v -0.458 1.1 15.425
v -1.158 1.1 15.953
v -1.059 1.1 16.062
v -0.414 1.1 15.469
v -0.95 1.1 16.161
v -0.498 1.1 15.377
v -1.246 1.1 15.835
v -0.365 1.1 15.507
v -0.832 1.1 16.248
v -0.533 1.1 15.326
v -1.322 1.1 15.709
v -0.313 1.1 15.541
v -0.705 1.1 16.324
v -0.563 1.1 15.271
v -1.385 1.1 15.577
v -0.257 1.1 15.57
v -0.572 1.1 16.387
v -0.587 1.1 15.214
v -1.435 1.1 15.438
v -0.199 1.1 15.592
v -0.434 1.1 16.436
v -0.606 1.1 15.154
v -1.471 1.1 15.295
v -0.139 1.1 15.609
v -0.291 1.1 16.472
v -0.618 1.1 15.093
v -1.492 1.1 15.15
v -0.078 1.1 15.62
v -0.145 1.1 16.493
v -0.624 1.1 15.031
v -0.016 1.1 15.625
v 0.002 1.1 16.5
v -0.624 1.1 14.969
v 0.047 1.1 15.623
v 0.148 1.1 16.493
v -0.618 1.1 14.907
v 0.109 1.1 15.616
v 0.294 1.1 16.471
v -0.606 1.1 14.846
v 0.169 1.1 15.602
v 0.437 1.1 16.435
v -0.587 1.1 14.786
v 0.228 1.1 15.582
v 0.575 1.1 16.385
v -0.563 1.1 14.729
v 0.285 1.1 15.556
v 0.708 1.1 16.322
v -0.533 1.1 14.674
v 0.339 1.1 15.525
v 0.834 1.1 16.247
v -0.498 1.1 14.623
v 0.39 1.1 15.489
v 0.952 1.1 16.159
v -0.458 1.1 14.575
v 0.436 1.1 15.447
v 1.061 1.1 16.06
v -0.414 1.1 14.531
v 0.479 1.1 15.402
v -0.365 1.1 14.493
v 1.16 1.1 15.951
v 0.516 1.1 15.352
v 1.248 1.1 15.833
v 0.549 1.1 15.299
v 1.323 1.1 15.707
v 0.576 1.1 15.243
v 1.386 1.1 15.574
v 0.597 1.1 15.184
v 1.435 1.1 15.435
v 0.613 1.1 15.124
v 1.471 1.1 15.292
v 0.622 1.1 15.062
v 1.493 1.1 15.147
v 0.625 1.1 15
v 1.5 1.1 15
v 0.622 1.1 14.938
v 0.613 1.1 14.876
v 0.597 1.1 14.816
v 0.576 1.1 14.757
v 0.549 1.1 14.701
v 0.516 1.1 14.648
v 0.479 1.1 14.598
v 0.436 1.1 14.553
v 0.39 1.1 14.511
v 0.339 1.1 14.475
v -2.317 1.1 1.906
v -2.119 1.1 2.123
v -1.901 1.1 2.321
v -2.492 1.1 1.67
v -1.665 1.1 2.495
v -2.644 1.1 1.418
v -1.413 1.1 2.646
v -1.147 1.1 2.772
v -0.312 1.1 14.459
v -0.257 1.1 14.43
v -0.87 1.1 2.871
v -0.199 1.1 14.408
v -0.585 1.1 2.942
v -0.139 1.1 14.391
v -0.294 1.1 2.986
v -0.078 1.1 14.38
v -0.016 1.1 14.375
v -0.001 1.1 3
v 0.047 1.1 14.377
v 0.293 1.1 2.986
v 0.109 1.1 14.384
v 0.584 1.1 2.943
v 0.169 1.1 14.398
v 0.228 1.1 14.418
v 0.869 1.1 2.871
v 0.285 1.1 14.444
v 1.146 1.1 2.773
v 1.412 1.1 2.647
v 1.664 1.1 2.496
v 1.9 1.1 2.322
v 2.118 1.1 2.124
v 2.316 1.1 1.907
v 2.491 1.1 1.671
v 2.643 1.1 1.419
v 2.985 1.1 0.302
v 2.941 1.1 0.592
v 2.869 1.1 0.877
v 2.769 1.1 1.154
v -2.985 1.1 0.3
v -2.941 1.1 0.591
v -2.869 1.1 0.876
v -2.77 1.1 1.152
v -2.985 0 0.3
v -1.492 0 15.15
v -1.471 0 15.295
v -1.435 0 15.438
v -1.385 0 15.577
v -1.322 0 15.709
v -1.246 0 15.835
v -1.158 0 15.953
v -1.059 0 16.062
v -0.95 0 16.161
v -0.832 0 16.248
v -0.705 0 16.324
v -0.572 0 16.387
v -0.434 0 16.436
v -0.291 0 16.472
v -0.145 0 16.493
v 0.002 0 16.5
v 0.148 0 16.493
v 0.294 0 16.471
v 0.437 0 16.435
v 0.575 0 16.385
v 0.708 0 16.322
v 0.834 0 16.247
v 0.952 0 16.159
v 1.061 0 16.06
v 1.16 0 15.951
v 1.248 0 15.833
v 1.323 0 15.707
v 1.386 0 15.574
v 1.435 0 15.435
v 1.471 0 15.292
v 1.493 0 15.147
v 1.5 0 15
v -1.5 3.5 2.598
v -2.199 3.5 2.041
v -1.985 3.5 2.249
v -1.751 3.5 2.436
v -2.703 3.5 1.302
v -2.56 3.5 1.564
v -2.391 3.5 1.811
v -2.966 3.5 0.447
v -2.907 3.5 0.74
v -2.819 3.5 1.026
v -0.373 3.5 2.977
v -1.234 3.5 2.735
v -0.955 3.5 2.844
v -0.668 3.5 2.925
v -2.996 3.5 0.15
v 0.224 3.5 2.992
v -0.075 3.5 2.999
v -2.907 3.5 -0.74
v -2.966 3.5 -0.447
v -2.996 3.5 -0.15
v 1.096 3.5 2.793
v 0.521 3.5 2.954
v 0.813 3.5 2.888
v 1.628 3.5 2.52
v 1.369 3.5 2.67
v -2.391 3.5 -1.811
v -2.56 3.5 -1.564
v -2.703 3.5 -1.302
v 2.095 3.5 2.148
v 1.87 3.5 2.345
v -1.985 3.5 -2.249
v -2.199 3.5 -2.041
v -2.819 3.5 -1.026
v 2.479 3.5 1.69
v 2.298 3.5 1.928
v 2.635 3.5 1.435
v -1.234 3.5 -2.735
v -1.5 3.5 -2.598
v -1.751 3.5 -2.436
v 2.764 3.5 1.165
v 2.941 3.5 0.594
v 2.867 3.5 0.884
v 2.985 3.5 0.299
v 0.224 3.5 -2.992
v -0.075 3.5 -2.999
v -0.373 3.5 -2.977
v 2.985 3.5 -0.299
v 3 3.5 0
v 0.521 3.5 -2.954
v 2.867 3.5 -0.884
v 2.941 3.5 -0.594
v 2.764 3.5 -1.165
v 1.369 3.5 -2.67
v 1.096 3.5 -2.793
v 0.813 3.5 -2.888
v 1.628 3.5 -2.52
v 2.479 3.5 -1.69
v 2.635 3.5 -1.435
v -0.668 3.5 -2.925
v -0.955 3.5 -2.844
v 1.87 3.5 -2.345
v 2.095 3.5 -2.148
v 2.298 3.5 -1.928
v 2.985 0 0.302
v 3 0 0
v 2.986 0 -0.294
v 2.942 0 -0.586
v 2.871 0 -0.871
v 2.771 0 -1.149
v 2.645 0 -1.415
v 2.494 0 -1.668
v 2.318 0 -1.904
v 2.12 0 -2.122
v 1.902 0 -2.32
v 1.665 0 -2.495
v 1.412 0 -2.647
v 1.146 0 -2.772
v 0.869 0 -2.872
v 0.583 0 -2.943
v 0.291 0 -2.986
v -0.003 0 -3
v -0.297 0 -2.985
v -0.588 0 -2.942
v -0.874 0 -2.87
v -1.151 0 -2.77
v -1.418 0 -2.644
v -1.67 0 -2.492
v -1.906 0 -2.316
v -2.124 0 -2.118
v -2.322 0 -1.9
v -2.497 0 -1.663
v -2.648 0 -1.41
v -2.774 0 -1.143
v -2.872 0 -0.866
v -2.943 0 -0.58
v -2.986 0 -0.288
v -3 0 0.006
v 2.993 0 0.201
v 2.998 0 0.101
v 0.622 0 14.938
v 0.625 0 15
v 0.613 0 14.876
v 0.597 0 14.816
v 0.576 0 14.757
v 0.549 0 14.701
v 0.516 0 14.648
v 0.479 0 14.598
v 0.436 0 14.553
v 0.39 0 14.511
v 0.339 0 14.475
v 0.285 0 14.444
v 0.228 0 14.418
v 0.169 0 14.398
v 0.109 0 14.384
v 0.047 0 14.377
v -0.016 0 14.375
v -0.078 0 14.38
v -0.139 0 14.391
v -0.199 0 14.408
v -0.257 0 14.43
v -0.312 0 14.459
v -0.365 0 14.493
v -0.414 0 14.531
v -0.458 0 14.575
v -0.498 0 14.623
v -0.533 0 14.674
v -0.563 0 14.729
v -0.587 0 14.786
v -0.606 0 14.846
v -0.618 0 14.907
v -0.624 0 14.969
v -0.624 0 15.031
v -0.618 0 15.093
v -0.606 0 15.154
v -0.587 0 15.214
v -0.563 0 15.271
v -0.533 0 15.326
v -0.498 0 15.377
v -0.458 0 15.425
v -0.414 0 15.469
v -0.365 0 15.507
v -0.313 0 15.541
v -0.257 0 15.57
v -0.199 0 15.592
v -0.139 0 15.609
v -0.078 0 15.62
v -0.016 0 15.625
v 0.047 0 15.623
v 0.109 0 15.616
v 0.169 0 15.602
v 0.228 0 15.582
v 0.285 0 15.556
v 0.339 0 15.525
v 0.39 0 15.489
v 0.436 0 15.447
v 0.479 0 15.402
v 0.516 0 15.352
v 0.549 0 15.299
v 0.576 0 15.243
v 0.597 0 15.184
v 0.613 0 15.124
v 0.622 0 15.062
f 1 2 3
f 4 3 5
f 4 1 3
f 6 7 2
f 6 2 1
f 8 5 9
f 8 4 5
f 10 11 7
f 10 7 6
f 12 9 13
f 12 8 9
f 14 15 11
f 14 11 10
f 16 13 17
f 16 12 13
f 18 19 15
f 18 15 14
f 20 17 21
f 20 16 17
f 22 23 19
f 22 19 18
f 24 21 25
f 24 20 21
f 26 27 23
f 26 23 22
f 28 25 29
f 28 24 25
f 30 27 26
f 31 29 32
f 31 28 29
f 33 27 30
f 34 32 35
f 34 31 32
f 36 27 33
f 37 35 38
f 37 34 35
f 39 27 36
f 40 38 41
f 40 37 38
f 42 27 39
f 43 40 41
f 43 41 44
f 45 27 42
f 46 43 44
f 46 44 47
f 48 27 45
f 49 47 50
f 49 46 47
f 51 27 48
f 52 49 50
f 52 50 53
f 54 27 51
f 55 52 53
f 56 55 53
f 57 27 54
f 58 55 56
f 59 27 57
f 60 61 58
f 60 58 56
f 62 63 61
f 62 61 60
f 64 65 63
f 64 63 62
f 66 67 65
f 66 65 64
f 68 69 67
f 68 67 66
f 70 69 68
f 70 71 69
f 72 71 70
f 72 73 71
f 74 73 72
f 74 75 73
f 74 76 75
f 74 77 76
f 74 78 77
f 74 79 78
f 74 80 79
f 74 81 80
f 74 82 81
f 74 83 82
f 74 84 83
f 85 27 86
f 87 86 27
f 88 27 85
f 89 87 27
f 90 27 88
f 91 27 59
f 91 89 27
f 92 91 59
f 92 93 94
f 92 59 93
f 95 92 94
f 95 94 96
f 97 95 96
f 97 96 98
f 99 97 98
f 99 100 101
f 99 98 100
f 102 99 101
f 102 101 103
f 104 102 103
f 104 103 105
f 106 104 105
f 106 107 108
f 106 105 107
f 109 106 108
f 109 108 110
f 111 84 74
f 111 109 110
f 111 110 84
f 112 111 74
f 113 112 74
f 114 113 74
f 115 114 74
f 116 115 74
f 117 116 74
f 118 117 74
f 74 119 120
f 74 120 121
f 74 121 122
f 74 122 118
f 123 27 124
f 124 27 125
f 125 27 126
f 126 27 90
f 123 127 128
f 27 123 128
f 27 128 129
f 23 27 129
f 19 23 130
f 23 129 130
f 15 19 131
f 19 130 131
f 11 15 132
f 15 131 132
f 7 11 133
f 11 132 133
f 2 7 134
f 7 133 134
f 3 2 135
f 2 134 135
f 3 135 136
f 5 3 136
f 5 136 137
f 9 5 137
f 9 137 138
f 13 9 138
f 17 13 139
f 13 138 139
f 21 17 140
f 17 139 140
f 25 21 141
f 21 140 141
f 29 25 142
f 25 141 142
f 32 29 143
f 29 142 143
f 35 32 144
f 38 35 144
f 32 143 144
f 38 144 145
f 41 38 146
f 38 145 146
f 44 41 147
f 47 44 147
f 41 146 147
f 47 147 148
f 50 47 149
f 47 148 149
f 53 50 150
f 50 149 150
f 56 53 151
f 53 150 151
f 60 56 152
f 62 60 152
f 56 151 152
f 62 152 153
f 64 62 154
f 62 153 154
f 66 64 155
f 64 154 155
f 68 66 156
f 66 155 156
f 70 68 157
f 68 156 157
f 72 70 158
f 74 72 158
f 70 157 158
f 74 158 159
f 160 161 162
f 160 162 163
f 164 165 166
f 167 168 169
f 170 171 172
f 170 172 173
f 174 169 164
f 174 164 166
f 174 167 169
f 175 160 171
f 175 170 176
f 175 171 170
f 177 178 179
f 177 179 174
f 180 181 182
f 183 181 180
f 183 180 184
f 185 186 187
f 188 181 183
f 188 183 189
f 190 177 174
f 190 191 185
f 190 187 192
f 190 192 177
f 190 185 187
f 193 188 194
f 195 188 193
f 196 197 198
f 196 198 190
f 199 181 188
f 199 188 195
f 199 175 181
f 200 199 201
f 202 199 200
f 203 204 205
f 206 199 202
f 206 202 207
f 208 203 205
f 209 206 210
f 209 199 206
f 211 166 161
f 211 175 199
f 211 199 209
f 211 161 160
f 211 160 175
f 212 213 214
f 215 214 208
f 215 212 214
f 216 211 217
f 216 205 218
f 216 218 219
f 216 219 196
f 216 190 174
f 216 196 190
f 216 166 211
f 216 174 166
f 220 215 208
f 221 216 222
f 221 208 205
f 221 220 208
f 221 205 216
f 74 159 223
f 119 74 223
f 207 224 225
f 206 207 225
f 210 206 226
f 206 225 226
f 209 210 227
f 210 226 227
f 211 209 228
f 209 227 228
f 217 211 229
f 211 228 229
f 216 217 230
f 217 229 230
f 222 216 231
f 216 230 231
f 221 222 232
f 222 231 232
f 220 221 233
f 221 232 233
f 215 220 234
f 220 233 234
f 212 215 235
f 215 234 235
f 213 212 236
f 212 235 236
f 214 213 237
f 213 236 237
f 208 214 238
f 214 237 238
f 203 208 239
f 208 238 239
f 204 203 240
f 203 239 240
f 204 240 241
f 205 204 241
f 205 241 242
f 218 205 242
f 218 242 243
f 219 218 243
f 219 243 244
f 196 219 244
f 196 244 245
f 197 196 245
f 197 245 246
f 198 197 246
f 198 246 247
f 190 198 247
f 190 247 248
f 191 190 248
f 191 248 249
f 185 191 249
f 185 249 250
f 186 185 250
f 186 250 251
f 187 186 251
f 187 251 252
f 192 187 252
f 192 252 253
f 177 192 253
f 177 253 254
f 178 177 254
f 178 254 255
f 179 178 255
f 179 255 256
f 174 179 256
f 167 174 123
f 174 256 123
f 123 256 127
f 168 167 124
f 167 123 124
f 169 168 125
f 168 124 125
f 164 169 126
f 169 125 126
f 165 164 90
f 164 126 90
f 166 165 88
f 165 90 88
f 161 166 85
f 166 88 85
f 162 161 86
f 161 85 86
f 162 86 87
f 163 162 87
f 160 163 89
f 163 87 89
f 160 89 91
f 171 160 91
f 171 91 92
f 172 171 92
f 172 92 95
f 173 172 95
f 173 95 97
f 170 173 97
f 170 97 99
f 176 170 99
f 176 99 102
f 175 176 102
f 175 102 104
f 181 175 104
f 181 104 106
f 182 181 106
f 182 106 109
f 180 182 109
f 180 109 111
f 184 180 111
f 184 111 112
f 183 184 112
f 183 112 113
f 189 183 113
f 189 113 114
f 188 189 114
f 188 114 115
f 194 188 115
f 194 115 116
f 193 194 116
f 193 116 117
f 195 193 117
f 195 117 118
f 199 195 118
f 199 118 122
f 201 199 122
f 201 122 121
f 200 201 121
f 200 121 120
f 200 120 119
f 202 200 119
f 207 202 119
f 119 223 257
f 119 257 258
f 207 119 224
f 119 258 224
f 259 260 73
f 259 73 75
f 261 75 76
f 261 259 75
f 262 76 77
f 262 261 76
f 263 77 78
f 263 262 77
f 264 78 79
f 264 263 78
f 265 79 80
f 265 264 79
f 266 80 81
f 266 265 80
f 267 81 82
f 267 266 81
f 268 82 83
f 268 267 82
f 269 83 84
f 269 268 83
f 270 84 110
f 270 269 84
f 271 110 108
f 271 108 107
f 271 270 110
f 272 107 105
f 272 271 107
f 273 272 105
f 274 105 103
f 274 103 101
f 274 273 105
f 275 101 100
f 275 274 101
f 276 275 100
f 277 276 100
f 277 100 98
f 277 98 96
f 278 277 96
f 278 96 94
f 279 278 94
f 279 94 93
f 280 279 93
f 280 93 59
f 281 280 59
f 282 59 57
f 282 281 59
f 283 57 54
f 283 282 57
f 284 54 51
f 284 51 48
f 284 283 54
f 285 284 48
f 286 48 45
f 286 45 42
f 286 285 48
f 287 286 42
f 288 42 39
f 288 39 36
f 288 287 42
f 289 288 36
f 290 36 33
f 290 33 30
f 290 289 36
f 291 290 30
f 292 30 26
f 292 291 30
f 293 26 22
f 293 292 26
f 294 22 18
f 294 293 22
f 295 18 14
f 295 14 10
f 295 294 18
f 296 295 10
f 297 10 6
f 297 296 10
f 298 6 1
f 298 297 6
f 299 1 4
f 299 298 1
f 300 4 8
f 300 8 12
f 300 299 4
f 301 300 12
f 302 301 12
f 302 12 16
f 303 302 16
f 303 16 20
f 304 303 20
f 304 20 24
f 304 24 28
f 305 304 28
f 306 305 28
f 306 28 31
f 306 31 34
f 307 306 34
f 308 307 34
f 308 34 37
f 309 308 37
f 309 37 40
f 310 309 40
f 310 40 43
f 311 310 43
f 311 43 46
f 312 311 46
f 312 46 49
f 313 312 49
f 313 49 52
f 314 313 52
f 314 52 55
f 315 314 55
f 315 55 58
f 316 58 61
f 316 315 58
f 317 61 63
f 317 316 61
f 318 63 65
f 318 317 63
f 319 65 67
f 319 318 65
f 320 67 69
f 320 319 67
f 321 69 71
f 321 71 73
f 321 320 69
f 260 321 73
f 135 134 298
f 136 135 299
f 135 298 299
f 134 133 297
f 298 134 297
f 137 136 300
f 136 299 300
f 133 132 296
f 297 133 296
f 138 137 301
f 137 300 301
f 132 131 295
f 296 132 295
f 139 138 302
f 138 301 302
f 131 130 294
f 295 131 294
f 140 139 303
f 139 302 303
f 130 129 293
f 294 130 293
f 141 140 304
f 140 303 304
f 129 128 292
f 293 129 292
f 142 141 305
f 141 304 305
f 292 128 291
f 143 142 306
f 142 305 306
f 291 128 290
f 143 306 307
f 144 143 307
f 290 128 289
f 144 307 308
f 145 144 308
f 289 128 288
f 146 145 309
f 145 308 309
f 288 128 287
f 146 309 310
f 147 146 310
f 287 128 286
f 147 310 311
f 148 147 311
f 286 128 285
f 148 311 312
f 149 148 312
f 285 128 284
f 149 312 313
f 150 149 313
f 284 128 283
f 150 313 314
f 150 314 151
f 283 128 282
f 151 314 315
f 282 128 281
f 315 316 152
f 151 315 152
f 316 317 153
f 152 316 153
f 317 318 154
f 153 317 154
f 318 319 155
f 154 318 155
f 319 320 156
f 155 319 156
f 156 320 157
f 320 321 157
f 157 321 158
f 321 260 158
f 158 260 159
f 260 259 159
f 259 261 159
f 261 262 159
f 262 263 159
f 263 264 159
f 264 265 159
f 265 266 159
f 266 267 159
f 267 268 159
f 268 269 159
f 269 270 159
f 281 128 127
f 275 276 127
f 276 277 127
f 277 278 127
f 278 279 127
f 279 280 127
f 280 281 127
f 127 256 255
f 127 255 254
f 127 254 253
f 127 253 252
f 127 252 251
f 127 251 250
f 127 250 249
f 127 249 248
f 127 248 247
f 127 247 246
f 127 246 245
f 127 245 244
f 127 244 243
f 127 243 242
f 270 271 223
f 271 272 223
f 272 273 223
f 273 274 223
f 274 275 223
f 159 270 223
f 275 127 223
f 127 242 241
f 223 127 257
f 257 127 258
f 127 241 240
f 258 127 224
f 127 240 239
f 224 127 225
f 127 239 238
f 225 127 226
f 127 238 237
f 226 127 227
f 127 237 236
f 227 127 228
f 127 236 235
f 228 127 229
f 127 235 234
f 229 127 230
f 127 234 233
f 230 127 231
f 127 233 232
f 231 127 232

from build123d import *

# Parameters (mm, degrees)
SKETCH1_R           = 3
BOSS_EXTRUDE1_DEPTH = 3.5
SKETCH2_R           = 1.5
SKETCH2_R_2         = 0.625
BOSS_EXTRUDE2_DEPTH = 1.1


with BuildPart() as part:
    # Sketch1 → Boss-Extrude1 (new body)
    with BuildSketch(Plane(origin=(0, 0, 0), x_dir=(1, 0, 0), z_dir=(0, 1, 0))):
        Circle(SKETCH1_R)
    extrude(amount=BOSS_EXTRUDE1_DEPTH)

    # Sketch2 → Boss-Extrude2 (add)
    with BuildSketch(Plane(origin=(0, 0, 0), x_dir=(1, 0, 0), z_dir=(0, 1, 0))):
        with Locations((0, -15)):
            Circle(SKETCH2_R)
        with Locations((0, -15)):
            Circle(SKETCH2_R_2, mode=Mode.SUBTRACT)
        with BuildLine():
            ThreePointArc((2.984809248, -0.301519075), (-0.000763384, -2.999999903), (-2.984962311, -0.3))
            Line((-2.984962311, -0.3), (-1.492481156, -15.15))
            ThreePointArc((-1.492481156, -15.15), (-0.075094163, -13.50188089), (1.5, -15))
            Line((1.5, -15), (2.984809248, -0.301519075))
        make_face()
    extrude(amount=BOSS_EXTRUDE2_DEPTH)


solid = part.part
